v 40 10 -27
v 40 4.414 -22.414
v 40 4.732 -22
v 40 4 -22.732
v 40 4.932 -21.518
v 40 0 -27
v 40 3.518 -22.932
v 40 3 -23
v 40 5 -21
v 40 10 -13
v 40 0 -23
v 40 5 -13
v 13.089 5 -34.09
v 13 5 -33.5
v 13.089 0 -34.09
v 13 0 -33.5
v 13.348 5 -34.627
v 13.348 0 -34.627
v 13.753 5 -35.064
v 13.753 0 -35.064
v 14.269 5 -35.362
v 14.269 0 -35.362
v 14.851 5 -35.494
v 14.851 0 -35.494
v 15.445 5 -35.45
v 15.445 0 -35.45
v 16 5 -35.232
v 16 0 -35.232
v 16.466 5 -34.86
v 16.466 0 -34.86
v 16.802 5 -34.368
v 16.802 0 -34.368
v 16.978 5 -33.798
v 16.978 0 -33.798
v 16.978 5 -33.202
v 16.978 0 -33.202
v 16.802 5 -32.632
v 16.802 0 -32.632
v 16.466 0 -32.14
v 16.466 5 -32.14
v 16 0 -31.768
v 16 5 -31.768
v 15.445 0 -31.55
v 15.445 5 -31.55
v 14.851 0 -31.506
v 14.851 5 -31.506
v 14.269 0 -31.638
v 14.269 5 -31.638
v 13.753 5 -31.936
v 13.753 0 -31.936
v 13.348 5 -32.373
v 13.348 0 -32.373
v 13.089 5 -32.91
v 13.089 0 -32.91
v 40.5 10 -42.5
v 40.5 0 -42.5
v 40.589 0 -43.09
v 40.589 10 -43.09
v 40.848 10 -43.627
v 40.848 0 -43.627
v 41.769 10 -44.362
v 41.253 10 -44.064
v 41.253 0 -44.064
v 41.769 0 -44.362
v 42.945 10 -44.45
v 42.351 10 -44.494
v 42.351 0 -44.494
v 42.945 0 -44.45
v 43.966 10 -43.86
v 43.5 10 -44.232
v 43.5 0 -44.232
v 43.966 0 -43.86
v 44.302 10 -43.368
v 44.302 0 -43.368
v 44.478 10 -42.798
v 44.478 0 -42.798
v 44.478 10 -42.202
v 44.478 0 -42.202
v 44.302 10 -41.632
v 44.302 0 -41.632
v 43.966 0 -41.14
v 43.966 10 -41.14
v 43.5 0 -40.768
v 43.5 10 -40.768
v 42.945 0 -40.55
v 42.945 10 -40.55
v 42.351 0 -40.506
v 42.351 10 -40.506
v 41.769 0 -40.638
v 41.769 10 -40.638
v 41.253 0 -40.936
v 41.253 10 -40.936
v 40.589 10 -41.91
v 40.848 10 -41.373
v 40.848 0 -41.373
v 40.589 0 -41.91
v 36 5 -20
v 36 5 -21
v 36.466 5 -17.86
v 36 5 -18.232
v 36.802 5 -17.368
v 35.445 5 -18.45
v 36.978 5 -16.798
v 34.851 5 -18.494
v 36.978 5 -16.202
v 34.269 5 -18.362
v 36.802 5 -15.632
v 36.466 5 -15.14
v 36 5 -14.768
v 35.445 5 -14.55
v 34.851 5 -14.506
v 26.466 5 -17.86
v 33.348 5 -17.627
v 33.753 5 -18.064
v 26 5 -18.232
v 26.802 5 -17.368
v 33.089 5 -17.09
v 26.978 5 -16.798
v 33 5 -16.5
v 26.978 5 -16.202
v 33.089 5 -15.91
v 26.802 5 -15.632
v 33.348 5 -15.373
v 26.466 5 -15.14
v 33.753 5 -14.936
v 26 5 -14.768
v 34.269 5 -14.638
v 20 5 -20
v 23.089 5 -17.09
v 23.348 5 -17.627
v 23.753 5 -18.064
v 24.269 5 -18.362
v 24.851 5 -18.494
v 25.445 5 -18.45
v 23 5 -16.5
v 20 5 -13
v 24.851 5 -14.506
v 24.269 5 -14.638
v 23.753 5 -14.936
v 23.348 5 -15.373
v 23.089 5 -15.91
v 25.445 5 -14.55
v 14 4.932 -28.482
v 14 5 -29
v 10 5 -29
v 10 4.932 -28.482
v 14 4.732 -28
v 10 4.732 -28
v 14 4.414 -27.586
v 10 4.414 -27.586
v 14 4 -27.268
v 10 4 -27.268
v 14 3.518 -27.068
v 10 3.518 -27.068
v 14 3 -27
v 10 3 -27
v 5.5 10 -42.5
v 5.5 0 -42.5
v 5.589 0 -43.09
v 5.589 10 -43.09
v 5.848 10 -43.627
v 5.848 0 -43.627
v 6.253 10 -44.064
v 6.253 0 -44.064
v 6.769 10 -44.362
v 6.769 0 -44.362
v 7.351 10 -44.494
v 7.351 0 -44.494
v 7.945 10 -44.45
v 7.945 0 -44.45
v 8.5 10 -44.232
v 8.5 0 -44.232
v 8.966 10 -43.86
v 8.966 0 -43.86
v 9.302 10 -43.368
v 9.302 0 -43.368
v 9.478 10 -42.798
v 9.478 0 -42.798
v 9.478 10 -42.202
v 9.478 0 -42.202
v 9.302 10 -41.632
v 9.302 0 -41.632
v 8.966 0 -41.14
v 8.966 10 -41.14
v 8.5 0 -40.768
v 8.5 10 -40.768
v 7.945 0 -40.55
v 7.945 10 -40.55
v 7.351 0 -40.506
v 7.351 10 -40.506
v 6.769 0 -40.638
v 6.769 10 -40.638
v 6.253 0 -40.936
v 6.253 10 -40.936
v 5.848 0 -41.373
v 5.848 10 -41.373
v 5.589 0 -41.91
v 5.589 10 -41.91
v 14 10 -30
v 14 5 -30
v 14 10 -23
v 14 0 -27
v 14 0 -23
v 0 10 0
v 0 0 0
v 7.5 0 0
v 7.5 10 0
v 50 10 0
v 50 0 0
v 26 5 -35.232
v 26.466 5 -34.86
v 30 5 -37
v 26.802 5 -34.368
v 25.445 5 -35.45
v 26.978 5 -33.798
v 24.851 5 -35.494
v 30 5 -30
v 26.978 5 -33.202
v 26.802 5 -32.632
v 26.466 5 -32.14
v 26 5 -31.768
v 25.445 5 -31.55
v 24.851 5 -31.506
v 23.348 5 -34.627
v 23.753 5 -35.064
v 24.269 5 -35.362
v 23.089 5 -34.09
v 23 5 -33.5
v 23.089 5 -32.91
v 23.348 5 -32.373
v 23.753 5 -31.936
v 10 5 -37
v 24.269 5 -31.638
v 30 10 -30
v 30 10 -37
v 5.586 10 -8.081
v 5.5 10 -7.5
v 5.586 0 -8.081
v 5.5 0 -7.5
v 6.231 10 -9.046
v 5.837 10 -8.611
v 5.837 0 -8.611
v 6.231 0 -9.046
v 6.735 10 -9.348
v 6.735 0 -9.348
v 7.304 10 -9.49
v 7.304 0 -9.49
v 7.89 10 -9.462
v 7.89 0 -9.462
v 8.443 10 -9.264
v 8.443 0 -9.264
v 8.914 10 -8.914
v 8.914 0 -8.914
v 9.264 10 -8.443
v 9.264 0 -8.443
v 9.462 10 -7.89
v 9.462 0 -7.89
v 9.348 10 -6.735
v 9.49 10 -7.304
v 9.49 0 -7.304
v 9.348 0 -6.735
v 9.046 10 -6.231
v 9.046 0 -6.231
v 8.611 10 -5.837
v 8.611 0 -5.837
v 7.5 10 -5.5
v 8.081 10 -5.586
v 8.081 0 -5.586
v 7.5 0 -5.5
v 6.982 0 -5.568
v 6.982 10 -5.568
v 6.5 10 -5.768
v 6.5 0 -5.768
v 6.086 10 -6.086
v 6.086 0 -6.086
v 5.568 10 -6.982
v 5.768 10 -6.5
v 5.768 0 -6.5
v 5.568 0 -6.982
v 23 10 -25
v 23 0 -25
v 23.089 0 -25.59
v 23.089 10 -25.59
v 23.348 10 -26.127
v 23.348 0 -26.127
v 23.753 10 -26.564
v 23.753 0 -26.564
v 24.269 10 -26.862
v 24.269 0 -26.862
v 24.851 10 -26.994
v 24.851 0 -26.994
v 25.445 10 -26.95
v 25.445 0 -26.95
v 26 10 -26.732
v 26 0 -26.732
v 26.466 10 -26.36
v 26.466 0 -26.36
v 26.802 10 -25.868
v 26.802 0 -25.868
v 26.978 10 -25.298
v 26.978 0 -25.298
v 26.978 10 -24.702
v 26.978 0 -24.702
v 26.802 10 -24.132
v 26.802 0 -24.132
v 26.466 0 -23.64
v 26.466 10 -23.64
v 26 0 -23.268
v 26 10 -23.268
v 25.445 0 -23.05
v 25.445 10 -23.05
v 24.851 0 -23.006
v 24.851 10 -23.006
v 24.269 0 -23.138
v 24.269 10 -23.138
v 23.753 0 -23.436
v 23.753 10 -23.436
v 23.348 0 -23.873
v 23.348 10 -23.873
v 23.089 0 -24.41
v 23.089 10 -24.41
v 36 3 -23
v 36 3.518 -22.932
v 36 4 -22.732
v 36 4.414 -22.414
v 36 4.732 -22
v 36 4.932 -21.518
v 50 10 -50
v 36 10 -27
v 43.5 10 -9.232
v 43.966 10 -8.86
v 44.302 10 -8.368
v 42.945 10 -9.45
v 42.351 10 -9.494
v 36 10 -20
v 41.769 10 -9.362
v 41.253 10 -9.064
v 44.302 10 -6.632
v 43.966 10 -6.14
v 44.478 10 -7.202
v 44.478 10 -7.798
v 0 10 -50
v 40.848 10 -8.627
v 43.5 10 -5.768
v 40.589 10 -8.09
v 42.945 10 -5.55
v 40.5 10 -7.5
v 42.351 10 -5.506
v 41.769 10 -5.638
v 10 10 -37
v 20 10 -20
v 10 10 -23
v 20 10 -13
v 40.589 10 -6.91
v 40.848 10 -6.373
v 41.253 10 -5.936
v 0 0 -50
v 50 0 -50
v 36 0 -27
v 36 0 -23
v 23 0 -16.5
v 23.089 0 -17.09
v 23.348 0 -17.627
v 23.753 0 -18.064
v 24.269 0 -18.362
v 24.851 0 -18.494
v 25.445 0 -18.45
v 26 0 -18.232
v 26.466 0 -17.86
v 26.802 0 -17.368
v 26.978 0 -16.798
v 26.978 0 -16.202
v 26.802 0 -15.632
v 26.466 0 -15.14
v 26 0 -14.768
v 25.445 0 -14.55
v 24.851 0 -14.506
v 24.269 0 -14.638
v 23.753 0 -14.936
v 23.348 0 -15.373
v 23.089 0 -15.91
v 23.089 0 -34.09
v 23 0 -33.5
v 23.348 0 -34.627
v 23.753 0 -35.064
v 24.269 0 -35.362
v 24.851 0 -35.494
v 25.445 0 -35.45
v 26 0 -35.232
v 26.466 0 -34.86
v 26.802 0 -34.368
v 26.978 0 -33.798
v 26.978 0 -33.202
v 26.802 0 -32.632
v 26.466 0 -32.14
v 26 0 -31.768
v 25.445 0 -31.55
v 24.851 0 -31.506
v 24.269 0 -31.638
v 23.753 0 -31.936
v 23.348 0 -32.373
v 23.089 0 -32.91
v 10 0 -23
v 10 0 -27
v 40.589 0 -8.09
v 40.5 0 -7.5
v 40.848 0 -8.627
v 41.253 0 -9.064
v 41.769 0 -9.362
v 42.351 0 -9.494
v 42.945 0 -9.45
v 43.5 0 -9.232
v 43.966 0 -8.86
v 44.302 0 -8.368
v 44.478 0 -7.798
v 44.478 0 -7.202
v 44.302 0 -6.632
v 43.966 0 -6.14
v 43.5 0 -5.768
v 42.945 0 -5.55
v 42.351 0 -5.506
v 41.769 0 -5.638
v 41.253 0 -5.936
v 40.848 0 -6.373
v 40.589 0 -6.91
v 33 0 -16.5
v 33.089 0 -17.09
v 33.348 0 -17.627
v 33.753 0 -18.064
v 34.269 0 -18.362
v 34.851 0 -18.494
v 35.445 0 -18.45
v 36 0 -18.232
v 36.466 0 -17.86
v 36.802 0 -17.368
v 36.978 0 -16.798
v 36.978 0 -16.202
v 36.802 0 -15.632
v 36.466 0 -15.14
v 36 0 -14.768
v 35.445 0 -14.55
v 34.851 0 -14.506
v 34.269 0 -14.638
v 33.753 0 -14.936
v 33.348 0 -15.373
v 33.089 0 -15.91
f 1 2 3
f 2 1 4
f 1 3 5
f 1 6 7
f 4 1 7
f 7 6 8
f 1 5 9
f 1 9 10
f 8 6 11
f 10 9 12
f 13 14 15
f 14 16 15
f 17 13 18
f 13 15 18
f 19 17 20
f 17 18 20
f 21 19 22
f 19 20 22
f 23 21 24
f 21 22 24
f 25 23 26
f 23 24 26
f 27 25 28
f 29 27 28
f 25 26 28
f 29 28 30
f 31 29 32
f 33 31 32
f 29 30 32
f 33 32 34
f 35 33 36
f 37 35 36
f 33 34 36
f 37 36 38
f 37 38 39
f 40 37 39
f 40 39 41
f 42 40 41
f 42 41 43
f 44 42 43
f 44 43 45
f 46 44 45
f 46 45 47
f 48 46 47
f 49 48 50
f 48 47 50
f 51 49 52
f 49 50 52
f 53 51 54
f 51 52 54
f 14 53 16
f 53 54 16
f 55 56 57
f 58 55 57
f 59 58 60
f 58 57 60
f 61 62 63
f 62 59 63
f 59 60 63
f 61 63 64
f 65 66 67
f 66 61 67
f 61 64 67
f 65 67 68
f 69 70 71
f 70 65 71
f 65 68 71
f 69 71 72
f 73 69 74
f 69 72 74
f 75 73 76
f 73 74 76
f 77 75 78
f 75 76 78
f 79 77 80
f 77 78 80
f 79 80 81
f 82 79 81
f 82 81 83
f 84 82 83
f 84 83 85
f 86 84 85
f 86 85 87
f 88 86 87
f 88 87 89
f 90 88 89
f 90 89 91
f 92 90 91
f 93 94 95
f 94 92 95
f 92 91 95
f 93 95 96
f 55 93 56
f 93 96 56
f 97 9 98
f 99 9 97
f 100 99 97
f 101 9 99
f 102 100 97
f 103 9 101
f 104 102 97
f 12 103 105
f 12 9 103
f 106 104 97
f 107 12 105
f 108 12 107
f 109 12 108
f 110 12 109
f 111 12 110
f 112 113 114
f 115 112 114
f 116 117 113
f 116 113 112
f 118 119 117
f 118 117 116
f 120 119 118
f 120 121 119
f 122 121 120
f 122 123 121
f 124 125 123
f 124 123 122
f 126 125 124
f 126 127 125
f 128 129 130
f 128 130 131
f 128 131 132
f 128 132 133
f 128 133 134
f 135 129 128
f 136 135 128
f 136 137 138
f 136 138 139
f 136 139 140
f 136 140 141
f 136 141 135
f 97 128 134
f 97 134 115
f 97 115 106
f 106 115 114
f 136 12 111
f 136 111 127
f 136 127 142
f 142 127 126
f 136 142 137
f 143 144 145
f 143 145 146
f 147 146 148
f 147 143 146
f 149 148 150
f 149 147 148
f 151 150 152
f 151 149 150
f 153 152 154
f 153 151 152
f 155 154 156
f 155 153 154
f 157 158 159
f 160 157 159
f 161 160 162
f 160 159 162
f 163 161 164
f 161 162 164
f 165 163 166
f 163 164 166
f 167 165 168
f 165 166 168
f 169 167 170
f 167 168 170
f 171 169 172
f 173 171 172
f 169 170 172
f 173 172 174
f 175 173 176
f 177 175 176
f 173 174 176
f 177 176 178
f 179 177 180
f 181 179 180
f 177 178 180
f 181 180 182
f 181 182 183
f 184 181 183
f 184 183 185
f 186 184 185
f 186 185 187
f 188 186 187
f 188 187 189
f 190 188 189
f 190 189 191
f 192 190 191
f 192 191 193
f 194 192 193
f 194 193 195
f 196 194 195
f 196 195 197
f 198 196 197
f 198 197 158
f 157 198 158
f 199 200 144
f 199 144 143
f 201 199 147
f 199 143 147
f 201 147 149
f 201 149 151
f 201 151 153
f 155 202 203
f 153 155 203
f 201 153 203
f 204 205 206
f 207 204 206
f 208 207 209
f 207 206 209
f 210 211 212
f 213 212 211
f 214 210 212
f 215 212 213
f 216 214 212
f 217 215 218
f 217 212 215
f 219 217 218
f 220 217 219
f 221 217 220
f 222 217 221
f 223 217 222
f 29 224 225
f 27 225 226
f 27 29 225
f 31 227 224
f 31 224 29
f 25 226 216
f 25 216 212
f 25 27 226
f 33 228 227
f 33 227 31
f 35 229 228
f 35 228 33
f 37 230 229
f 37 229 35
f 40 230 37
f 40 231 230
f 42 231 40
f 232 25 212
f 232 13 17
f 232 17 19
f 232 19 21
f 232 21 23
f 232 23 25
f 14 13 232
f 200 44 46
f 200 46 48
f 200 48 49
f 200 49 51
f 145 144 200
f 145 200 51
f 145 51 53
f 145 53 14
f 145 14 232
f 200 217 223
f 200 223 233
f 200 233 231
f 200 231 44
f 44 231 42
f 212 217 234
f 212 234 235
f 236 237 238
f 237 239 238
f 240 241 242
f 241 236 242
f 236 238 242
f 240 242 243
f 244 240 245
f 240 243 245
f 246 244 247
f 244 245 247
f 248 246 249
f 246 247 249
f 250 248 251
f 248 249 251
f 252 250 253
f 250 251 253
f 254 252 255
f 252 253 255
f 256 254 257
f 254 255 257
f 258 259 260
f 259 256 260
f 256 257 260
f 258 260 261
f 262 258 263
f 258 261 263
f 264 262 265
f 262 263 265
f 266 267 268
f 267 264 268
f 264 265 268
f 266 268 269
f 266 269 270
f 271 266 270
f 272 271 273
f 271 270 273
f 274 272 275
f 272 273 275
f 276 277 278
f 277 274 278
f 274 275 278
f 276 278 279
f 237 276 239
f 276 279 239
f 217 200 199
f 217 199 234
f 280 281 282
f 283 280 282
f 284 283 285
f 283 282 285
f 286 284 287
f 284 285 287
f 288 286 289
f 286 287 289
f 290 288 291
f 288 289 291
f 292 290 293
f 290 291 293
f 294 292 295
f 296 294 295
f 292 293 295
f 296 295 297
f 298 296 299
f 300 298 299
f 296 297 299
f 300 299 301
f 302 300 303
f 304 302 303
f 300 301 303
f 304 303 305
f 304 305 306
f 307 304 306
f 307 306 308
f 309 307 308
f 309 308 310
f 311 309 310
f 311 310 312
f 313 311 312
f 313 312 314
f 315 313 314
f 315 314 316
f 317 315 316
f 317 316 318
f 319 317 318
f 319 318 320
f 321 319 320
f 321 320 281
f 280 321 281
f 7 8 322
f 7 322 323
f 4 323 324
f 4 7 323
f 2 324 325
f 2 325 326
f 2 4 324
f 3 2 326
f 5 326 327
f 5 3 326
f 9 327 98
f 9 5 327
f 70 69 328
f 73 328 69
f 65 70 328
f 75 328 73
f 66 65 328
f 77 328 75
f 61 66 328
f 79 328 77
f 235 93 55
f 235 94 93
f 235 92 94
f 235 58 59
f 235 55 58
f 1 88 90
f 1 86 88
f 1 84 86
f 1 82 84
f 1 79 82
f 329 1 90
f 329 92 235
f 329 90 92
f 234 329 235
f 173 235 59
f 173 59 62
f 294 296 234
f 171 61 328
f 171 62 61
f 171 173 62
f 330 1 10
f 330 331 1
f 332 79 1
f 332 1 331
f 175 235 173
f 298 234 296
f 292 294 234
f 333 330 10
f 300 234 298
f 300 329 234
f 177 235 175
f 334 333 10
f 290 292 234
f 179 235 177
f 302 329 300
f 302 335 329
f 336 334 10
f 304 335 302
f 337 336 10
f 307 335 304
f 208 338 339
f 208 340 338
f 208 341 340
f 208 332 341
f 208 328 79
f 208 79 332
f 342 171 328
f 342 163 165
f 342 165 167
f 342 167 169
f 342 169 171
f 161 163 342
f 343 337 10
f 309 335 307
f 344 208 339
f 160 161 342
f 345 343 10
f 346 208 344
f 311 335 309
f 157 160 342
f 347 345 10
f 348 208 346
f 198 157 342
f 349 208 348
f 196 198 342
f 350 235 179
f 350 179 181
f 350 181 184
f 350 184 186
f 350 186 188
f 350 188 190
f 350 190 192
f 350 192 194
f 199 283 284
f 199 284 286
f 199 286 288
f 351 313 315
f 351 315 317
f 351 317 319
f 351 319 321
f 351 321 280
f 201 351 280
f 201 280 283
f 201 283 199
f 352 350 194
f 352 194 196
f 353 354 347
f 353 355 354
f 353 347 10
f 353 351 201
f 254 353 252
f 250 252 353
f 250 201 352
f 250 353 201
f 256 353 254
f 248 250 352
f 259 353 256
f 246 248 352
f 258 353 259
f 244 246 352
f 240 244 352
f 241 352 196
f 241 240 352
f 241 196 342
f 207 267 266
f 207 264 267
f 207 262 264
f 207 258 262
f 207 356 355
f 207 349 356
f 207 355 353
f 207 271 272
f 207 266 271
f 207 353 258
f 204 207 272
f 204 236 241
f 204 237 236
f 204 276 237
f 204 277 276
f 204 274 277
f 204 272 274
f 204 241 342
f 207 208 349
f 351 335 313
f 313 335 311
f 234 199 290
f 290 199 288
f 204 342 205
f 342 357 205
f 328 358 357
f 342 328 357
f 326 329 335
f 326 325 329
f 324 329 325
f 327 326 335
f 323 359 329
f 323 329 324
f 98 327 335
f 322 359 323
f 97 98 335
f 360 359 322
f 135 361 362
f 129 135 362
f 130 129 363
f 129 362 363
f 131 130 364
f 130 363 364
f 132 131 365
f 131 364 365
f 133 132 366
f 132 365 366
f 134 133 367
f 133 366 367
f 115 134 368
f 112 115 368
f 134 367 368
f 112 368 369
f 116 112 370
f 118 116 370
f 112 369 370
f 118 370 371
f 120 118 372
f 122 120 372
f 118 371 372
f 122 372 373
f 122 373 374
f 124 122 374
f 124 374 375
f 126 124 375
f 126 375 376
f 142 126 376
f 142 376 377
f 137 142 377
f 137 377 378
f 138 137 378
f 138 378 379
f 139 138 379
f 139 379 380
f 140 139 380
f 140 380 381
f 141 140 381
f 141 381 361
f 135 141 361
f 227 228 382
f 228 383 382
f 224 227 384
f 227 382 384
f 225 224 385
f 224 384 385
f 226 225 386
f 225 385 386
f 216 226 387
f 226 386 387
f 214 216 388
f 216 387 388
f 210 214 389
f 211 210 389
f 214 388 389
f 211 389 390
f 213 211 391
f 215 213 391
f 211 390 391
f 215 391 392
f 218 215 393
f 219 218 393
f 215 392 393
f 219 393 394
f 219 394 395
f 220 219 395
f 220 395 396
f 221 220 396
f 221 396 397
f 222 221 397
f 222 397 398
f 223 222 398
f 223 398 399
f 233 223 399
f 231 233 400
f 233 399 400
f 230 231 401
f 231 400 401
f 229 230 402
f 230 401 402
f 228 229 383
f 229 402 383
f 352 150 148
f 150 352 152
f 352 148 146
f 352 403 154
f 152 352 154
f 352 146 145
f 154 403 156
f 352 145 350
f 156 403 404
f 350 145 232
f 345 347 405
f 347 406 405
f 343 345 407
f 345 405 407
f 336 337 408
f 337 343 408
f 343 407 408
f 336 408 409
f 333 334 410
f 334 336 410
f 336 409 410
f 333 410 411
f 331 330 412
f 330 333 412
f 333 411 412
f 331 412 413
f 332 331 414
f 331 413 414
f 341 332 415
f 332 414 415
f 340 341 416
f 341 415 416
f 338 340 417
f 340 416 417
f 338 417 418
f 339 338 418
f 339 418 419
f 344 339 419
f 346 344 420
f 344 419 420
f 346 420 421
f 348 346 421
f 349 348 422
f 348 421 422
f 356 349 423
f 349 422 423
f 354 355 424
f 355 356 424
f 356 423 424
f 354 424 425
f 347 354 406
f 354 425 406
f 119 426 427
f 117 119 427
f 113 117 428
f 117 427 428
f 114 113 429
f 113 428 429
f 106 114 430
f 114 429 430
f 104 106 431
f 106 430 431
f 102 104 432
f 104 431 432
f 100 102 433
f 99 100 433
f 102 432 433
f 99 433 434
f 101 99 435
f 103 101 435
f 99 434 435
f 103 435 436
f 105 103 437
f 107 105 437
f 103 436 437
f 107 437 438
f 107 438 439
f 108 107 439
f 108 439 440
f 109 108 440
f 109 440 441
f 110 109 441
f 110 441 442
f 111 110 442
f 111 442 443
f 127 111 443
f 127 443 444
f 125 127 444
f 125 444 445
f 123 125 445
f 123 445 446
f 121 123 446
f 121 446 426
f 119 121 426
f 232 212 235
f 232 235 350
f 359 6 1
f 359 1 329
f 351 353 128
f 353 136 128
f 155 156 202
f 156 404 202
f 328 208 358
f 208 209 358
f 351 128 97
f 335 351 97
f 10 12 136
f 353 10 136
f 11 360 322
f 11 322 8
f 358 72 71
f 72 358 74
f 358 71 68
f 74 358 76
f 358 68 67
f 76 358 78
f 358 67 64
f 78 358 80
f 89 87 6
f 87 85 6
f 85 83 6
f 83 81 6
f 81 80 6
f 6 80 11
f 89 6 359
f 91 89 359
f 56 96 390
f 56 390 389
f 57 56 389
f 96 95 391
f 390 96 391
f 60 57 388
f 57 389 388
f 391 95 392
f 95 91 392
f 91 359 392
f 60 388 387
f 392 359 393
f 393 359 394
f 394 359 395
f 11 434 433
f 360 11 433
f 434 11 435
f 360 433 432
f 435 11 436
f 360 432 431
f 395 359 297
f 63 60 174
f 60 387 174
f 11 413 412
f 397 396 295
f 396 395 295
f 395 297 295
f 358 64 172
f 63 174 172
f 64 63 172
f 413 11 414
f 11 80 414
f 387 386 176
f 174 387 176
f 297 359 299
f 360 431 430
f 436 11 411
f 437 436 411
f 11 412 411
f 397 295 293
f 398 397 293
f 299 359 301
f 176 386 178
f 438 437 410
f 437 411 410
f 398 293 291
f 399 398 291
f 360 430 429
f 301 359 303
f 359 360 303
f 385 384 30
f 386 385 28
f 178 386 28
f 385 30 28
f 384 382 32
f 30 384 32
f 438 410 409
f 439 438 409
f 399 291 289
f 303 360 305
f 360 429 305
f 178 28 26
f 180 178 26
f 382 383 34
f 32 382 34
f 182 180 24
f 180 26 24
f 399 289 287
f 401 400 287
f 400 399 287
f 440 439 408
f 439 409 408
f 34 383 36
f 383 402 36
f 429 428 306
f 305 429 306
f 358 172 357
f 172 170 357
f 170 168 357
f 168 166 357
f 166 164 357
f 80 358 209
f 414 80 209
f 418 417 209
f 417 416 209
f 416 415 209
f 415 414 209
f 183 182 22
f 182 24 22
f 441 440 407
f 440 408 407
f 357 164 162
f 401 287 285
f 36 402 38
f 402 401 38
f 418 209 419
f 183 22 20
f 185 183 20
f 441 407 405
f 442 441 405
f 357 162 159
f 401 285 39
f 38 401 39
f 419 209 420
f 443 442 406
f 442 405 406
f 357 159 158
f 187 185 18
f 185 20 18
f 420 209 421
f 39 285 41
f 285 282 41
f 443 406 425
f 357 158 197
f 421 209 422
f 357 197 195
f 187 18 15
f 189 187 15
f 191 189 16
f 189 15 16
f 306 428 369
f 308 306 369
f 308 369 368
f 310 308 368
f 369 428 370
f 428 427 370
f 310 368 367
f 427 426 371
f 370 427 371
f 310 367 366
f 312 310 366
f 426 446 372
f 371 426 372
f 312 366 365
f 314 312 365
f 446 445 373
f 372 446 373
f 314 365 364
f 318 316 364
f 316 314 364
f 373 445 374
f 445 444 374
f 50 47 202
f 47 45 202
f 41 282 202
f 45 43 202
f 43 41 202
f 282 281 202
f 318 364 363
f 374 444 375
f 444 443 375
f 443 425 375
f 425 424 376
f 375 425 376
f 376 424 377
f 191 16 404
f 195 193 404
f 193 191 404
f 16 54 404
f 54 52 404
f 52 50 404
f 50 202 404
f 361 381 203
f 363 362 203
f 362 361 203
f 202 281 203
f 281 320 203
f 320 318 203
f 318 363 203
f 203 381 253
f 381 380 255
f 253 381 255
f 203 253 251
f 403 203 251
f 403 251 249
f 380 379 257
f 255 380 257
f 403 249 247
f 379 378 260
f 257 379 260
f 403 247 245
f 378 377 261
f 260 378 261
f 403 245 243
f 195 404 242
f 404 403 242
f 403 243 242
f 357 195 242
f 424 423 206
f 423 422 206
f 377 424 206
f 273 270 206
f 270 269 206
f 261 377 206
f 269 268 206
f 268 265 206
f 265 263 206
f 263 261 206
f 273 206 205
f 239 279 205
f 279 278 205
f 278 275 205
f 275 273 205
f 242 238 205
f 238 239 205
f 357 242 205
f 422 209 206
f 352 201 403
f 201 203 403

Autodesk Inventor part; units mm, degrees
ref_plane "YZ Plane" through (0, 0, 0) normal (1, 0, 0) x (0, 1, 0)
ref_plane "XZ Plane" through (0, 0, 0) normal (0, 1, 0) x (-1, 0, 0)
ref_plane "XY Plane" through (0, 0, 0) normal (0, 0, 1) x (1, 0, 0)
sketch "Sketch1" plane through (0, 0, 0) normal (0, 1, 0) x (-1, 0, 0)
  point P0 (0, 0)
sketch "Sketch2" plane through (0, 0, 0) normal (0, 1, 0) x (-1, 0, 0)
  line L0 (0, 0) -> (-50, 0)
  line L1 (-50, 0) -> (-50, -50)
  line L2 (-50, -50) -> (0, -50)
  line L3 (0, -50) -> (0, 0)
  line L4 (0, -25) -> (-11.3835, -25)
  line L5 (-25, -50) -> (-25, 0)
  circle A0 centre (-7.5, -42.5) radius 2
  circle A1 centre (-7.5, -7.5) radius 2
  line L6 (-7.5, -42.5) -> (-7.5, -50)
  line L7 (-7.5, -7.5) -> (-7.5, 0)
  line L8 (-7.5, -42.5) -> (0, -42.5)
  line L9 (-10, -27) -> (-14, -27)
  line L10 (-14, -27) -> (-14, -23)
  line L11 (-14, -23) -> (-10, -23)
  line L12 (-10, -23) -> (-10, -27)
  circle A2 centre (-42.5, -42.5) radius 2
  circle A3 centre (-42.5, -7.5) radius 2
  line L13 (-40, -27) -> (-36, -27)
  line L14 (-36, -27) -> (-36, -23)
  line L15 (-36, -23) -> (-40, -23)
  line L16 (-40, -23) -> (-40, -27)
  circle A4 centre (-25, -25) radius 2
  line L17 (-14, -27) -> (-14, -30)
  line L18 (-14, -30) -> (-30, -30)
  line L19 (-30, -30) -> (-30, -37)
  line L20 (-30, -37) -> (-10, -37)
  line L21 (-10, -37) -> (-10, -27)
  line L22 (-40, -23) -> (-40, -13)
  line L23 (-40, -13) -> (-20, -13)
  line L24 (-20, -13) -> (-20, -20)
  line L25 (-20, -20) -> (-36, -20)
  line L26 (-36, -20) -> (-36, -23)
  line L27 (-30, -33.5) -> (-10, -33.5)
  line L28 (-20, -16.5) -> (-40, -16.5)
  circle A5 centre (-25, -33.5) radius 2
  circle A6 centre (-15, -33.5) radius 2
  circle A7 centre (-25, -16.5) radius 2
  circle A8 centre (-35, -16.5) radius 2
  point P0 (-10, -25)
  point P1 (-40, -25)
  dimension "d0" = 50
  dimension "d1" = 4
  dimension "d2" = 35
  dimension "d6" = 4
  dimension "d7" = 10
  dimension "d8" = 4
  dimension "d9" = 10
  dimension "d10" = 7
  dimension "d11" = 20
  dimension "d12" = 10
  dimension "d13" = 10
  dimension "d14" = 4
  dimension "d15" = 4
  dimension "d16" = 4
  dimension "d17" = 4
extrude "Extrusion1" add sketch "Sketch2" along normal blind 10 contours L3 L4 L12 L11 L10 L17 L18 L5 A4 L25 L24 L23 L0 | L3 L8 A0 L6 L2 L5 L20 L21 L12 L4 | L5 L23 L22 L16 L13 L14 L26 L25 A4 L18 L19 L20 L2 L1 L0 | L3 L2 L6 A0 L8
extrude "Extrusion2" add sketch "Sketch2" along normal blind 5 contours L23 L24 L28 A7 L5 | L5 A7 L28 A8 L22 L23 | L21 L27 A6 A5 L5 L18 L17 L9 | L21 L20 L5 A5 L27 A6 | L28 L24 L25 L5 A7 | A7 L5 L25 L26 L15 L22 L28 A8 | L20 L19 L27 A5 L5 | L5 A5 L27 L19 L18
fillet "Fillet1" radius 2 2 edges at (12, 5, -27) (38, 5, -23)
equation "\"d0\" = width"
equation "\"d1\" = screw_hole_diameter"
equation "\"d2\" = hole_spacing"
equation "\"d6\" = cabel_channel_depth"
equation "\"d7\" = rail_depth"
equation "\"d8\" = screw_hole_diameter"
equation "\"d18\" = plate_thicknes"
equation "\"d20\" = 0.5 * plate_thicknes"
equation "\"plate_thicknes\" = 10"
equation "\"width\" = 50"
equation "\"screw_hole_diameter\" = 4"
equation "\"hole_spacing\" = 35"
equation "\"cabel_channel_depth\" = 4"
equation "\"rail_depth\" = 10"
properties part number "2_inner_leg_top_plate"
